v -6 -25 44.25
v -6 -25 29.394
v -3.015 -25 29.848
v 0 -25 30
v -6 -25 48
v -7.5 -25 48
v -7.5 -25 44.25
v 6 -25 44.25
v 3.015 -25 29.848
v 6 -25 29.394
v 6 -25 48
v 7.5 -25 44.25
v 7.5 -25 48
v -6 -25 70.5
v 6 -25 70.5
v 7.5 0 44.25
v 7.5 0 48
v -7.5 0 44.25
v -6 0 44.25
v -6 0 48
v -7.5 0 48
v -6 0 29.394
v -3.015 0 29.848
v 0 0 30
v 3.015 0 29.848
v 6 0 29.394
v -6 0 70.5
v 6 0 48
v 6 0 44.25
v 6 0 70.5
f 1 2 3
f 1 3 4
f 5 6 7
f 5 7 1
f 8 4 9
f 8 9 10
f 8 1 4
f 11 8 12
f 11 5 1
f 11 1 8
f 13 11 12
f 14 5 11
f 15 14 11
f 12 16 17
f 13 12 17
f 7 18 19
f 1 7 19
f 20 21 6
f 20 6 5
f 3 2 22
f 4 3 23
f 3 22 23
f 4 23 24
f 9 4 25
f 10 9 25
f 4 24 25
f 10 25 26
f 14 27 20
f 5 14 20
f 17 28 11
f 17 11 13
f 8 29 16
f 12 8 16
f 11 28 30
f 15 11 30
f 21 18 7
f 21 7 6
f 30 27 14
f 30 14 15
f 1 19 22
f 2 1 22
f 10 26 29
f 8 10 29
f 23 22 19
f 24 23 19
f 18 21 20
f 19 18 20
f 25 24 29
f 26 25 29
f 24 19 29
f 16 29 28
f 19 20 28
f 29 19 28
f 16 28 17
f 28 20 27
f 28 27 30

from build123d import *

# Parameters (mm, degrees)
F0_W     = 1.5
F0_H     = 3.75
F0_W_2   = 12
F0_H_2   = 1.5
F0_H_3   = 21
F1_DEPTH = 25


with BuildPart() as f1:
    # F0 (on Front) → F1 (new body)
    with BuildSketch(Plane.XZ):
        with Locations((6.75, 46.125)):
            Rectangle(F0_W, F0_H)
        with Locations((-6.75, 46.125)):
            Rectangle(F0_W, F0_H)
        with Locations((0, 69.75)):
            Rectangle(F0_W_2, F0_H_2)
        with Locations((0, 58.5)):
            Rectangle(F0_W_2, F0_H_3)
        with Locations((0, 46.125)):
            Rectangle(F0_W_2, F0_H)
        with BuildLine():
            ThreePointArc((-6, 29.3938769134), (0, 30), (6, 29.3938769134))
            Line((6, 29.3938769134), (6, 44.25))
            Line((6, 44.25), (-6, 44.25))
            Line((-6, 44.25), (-6, 29.3938769134))
        make_face()
    extrude(amount=F1_DEPTH)


solid = f1.part
